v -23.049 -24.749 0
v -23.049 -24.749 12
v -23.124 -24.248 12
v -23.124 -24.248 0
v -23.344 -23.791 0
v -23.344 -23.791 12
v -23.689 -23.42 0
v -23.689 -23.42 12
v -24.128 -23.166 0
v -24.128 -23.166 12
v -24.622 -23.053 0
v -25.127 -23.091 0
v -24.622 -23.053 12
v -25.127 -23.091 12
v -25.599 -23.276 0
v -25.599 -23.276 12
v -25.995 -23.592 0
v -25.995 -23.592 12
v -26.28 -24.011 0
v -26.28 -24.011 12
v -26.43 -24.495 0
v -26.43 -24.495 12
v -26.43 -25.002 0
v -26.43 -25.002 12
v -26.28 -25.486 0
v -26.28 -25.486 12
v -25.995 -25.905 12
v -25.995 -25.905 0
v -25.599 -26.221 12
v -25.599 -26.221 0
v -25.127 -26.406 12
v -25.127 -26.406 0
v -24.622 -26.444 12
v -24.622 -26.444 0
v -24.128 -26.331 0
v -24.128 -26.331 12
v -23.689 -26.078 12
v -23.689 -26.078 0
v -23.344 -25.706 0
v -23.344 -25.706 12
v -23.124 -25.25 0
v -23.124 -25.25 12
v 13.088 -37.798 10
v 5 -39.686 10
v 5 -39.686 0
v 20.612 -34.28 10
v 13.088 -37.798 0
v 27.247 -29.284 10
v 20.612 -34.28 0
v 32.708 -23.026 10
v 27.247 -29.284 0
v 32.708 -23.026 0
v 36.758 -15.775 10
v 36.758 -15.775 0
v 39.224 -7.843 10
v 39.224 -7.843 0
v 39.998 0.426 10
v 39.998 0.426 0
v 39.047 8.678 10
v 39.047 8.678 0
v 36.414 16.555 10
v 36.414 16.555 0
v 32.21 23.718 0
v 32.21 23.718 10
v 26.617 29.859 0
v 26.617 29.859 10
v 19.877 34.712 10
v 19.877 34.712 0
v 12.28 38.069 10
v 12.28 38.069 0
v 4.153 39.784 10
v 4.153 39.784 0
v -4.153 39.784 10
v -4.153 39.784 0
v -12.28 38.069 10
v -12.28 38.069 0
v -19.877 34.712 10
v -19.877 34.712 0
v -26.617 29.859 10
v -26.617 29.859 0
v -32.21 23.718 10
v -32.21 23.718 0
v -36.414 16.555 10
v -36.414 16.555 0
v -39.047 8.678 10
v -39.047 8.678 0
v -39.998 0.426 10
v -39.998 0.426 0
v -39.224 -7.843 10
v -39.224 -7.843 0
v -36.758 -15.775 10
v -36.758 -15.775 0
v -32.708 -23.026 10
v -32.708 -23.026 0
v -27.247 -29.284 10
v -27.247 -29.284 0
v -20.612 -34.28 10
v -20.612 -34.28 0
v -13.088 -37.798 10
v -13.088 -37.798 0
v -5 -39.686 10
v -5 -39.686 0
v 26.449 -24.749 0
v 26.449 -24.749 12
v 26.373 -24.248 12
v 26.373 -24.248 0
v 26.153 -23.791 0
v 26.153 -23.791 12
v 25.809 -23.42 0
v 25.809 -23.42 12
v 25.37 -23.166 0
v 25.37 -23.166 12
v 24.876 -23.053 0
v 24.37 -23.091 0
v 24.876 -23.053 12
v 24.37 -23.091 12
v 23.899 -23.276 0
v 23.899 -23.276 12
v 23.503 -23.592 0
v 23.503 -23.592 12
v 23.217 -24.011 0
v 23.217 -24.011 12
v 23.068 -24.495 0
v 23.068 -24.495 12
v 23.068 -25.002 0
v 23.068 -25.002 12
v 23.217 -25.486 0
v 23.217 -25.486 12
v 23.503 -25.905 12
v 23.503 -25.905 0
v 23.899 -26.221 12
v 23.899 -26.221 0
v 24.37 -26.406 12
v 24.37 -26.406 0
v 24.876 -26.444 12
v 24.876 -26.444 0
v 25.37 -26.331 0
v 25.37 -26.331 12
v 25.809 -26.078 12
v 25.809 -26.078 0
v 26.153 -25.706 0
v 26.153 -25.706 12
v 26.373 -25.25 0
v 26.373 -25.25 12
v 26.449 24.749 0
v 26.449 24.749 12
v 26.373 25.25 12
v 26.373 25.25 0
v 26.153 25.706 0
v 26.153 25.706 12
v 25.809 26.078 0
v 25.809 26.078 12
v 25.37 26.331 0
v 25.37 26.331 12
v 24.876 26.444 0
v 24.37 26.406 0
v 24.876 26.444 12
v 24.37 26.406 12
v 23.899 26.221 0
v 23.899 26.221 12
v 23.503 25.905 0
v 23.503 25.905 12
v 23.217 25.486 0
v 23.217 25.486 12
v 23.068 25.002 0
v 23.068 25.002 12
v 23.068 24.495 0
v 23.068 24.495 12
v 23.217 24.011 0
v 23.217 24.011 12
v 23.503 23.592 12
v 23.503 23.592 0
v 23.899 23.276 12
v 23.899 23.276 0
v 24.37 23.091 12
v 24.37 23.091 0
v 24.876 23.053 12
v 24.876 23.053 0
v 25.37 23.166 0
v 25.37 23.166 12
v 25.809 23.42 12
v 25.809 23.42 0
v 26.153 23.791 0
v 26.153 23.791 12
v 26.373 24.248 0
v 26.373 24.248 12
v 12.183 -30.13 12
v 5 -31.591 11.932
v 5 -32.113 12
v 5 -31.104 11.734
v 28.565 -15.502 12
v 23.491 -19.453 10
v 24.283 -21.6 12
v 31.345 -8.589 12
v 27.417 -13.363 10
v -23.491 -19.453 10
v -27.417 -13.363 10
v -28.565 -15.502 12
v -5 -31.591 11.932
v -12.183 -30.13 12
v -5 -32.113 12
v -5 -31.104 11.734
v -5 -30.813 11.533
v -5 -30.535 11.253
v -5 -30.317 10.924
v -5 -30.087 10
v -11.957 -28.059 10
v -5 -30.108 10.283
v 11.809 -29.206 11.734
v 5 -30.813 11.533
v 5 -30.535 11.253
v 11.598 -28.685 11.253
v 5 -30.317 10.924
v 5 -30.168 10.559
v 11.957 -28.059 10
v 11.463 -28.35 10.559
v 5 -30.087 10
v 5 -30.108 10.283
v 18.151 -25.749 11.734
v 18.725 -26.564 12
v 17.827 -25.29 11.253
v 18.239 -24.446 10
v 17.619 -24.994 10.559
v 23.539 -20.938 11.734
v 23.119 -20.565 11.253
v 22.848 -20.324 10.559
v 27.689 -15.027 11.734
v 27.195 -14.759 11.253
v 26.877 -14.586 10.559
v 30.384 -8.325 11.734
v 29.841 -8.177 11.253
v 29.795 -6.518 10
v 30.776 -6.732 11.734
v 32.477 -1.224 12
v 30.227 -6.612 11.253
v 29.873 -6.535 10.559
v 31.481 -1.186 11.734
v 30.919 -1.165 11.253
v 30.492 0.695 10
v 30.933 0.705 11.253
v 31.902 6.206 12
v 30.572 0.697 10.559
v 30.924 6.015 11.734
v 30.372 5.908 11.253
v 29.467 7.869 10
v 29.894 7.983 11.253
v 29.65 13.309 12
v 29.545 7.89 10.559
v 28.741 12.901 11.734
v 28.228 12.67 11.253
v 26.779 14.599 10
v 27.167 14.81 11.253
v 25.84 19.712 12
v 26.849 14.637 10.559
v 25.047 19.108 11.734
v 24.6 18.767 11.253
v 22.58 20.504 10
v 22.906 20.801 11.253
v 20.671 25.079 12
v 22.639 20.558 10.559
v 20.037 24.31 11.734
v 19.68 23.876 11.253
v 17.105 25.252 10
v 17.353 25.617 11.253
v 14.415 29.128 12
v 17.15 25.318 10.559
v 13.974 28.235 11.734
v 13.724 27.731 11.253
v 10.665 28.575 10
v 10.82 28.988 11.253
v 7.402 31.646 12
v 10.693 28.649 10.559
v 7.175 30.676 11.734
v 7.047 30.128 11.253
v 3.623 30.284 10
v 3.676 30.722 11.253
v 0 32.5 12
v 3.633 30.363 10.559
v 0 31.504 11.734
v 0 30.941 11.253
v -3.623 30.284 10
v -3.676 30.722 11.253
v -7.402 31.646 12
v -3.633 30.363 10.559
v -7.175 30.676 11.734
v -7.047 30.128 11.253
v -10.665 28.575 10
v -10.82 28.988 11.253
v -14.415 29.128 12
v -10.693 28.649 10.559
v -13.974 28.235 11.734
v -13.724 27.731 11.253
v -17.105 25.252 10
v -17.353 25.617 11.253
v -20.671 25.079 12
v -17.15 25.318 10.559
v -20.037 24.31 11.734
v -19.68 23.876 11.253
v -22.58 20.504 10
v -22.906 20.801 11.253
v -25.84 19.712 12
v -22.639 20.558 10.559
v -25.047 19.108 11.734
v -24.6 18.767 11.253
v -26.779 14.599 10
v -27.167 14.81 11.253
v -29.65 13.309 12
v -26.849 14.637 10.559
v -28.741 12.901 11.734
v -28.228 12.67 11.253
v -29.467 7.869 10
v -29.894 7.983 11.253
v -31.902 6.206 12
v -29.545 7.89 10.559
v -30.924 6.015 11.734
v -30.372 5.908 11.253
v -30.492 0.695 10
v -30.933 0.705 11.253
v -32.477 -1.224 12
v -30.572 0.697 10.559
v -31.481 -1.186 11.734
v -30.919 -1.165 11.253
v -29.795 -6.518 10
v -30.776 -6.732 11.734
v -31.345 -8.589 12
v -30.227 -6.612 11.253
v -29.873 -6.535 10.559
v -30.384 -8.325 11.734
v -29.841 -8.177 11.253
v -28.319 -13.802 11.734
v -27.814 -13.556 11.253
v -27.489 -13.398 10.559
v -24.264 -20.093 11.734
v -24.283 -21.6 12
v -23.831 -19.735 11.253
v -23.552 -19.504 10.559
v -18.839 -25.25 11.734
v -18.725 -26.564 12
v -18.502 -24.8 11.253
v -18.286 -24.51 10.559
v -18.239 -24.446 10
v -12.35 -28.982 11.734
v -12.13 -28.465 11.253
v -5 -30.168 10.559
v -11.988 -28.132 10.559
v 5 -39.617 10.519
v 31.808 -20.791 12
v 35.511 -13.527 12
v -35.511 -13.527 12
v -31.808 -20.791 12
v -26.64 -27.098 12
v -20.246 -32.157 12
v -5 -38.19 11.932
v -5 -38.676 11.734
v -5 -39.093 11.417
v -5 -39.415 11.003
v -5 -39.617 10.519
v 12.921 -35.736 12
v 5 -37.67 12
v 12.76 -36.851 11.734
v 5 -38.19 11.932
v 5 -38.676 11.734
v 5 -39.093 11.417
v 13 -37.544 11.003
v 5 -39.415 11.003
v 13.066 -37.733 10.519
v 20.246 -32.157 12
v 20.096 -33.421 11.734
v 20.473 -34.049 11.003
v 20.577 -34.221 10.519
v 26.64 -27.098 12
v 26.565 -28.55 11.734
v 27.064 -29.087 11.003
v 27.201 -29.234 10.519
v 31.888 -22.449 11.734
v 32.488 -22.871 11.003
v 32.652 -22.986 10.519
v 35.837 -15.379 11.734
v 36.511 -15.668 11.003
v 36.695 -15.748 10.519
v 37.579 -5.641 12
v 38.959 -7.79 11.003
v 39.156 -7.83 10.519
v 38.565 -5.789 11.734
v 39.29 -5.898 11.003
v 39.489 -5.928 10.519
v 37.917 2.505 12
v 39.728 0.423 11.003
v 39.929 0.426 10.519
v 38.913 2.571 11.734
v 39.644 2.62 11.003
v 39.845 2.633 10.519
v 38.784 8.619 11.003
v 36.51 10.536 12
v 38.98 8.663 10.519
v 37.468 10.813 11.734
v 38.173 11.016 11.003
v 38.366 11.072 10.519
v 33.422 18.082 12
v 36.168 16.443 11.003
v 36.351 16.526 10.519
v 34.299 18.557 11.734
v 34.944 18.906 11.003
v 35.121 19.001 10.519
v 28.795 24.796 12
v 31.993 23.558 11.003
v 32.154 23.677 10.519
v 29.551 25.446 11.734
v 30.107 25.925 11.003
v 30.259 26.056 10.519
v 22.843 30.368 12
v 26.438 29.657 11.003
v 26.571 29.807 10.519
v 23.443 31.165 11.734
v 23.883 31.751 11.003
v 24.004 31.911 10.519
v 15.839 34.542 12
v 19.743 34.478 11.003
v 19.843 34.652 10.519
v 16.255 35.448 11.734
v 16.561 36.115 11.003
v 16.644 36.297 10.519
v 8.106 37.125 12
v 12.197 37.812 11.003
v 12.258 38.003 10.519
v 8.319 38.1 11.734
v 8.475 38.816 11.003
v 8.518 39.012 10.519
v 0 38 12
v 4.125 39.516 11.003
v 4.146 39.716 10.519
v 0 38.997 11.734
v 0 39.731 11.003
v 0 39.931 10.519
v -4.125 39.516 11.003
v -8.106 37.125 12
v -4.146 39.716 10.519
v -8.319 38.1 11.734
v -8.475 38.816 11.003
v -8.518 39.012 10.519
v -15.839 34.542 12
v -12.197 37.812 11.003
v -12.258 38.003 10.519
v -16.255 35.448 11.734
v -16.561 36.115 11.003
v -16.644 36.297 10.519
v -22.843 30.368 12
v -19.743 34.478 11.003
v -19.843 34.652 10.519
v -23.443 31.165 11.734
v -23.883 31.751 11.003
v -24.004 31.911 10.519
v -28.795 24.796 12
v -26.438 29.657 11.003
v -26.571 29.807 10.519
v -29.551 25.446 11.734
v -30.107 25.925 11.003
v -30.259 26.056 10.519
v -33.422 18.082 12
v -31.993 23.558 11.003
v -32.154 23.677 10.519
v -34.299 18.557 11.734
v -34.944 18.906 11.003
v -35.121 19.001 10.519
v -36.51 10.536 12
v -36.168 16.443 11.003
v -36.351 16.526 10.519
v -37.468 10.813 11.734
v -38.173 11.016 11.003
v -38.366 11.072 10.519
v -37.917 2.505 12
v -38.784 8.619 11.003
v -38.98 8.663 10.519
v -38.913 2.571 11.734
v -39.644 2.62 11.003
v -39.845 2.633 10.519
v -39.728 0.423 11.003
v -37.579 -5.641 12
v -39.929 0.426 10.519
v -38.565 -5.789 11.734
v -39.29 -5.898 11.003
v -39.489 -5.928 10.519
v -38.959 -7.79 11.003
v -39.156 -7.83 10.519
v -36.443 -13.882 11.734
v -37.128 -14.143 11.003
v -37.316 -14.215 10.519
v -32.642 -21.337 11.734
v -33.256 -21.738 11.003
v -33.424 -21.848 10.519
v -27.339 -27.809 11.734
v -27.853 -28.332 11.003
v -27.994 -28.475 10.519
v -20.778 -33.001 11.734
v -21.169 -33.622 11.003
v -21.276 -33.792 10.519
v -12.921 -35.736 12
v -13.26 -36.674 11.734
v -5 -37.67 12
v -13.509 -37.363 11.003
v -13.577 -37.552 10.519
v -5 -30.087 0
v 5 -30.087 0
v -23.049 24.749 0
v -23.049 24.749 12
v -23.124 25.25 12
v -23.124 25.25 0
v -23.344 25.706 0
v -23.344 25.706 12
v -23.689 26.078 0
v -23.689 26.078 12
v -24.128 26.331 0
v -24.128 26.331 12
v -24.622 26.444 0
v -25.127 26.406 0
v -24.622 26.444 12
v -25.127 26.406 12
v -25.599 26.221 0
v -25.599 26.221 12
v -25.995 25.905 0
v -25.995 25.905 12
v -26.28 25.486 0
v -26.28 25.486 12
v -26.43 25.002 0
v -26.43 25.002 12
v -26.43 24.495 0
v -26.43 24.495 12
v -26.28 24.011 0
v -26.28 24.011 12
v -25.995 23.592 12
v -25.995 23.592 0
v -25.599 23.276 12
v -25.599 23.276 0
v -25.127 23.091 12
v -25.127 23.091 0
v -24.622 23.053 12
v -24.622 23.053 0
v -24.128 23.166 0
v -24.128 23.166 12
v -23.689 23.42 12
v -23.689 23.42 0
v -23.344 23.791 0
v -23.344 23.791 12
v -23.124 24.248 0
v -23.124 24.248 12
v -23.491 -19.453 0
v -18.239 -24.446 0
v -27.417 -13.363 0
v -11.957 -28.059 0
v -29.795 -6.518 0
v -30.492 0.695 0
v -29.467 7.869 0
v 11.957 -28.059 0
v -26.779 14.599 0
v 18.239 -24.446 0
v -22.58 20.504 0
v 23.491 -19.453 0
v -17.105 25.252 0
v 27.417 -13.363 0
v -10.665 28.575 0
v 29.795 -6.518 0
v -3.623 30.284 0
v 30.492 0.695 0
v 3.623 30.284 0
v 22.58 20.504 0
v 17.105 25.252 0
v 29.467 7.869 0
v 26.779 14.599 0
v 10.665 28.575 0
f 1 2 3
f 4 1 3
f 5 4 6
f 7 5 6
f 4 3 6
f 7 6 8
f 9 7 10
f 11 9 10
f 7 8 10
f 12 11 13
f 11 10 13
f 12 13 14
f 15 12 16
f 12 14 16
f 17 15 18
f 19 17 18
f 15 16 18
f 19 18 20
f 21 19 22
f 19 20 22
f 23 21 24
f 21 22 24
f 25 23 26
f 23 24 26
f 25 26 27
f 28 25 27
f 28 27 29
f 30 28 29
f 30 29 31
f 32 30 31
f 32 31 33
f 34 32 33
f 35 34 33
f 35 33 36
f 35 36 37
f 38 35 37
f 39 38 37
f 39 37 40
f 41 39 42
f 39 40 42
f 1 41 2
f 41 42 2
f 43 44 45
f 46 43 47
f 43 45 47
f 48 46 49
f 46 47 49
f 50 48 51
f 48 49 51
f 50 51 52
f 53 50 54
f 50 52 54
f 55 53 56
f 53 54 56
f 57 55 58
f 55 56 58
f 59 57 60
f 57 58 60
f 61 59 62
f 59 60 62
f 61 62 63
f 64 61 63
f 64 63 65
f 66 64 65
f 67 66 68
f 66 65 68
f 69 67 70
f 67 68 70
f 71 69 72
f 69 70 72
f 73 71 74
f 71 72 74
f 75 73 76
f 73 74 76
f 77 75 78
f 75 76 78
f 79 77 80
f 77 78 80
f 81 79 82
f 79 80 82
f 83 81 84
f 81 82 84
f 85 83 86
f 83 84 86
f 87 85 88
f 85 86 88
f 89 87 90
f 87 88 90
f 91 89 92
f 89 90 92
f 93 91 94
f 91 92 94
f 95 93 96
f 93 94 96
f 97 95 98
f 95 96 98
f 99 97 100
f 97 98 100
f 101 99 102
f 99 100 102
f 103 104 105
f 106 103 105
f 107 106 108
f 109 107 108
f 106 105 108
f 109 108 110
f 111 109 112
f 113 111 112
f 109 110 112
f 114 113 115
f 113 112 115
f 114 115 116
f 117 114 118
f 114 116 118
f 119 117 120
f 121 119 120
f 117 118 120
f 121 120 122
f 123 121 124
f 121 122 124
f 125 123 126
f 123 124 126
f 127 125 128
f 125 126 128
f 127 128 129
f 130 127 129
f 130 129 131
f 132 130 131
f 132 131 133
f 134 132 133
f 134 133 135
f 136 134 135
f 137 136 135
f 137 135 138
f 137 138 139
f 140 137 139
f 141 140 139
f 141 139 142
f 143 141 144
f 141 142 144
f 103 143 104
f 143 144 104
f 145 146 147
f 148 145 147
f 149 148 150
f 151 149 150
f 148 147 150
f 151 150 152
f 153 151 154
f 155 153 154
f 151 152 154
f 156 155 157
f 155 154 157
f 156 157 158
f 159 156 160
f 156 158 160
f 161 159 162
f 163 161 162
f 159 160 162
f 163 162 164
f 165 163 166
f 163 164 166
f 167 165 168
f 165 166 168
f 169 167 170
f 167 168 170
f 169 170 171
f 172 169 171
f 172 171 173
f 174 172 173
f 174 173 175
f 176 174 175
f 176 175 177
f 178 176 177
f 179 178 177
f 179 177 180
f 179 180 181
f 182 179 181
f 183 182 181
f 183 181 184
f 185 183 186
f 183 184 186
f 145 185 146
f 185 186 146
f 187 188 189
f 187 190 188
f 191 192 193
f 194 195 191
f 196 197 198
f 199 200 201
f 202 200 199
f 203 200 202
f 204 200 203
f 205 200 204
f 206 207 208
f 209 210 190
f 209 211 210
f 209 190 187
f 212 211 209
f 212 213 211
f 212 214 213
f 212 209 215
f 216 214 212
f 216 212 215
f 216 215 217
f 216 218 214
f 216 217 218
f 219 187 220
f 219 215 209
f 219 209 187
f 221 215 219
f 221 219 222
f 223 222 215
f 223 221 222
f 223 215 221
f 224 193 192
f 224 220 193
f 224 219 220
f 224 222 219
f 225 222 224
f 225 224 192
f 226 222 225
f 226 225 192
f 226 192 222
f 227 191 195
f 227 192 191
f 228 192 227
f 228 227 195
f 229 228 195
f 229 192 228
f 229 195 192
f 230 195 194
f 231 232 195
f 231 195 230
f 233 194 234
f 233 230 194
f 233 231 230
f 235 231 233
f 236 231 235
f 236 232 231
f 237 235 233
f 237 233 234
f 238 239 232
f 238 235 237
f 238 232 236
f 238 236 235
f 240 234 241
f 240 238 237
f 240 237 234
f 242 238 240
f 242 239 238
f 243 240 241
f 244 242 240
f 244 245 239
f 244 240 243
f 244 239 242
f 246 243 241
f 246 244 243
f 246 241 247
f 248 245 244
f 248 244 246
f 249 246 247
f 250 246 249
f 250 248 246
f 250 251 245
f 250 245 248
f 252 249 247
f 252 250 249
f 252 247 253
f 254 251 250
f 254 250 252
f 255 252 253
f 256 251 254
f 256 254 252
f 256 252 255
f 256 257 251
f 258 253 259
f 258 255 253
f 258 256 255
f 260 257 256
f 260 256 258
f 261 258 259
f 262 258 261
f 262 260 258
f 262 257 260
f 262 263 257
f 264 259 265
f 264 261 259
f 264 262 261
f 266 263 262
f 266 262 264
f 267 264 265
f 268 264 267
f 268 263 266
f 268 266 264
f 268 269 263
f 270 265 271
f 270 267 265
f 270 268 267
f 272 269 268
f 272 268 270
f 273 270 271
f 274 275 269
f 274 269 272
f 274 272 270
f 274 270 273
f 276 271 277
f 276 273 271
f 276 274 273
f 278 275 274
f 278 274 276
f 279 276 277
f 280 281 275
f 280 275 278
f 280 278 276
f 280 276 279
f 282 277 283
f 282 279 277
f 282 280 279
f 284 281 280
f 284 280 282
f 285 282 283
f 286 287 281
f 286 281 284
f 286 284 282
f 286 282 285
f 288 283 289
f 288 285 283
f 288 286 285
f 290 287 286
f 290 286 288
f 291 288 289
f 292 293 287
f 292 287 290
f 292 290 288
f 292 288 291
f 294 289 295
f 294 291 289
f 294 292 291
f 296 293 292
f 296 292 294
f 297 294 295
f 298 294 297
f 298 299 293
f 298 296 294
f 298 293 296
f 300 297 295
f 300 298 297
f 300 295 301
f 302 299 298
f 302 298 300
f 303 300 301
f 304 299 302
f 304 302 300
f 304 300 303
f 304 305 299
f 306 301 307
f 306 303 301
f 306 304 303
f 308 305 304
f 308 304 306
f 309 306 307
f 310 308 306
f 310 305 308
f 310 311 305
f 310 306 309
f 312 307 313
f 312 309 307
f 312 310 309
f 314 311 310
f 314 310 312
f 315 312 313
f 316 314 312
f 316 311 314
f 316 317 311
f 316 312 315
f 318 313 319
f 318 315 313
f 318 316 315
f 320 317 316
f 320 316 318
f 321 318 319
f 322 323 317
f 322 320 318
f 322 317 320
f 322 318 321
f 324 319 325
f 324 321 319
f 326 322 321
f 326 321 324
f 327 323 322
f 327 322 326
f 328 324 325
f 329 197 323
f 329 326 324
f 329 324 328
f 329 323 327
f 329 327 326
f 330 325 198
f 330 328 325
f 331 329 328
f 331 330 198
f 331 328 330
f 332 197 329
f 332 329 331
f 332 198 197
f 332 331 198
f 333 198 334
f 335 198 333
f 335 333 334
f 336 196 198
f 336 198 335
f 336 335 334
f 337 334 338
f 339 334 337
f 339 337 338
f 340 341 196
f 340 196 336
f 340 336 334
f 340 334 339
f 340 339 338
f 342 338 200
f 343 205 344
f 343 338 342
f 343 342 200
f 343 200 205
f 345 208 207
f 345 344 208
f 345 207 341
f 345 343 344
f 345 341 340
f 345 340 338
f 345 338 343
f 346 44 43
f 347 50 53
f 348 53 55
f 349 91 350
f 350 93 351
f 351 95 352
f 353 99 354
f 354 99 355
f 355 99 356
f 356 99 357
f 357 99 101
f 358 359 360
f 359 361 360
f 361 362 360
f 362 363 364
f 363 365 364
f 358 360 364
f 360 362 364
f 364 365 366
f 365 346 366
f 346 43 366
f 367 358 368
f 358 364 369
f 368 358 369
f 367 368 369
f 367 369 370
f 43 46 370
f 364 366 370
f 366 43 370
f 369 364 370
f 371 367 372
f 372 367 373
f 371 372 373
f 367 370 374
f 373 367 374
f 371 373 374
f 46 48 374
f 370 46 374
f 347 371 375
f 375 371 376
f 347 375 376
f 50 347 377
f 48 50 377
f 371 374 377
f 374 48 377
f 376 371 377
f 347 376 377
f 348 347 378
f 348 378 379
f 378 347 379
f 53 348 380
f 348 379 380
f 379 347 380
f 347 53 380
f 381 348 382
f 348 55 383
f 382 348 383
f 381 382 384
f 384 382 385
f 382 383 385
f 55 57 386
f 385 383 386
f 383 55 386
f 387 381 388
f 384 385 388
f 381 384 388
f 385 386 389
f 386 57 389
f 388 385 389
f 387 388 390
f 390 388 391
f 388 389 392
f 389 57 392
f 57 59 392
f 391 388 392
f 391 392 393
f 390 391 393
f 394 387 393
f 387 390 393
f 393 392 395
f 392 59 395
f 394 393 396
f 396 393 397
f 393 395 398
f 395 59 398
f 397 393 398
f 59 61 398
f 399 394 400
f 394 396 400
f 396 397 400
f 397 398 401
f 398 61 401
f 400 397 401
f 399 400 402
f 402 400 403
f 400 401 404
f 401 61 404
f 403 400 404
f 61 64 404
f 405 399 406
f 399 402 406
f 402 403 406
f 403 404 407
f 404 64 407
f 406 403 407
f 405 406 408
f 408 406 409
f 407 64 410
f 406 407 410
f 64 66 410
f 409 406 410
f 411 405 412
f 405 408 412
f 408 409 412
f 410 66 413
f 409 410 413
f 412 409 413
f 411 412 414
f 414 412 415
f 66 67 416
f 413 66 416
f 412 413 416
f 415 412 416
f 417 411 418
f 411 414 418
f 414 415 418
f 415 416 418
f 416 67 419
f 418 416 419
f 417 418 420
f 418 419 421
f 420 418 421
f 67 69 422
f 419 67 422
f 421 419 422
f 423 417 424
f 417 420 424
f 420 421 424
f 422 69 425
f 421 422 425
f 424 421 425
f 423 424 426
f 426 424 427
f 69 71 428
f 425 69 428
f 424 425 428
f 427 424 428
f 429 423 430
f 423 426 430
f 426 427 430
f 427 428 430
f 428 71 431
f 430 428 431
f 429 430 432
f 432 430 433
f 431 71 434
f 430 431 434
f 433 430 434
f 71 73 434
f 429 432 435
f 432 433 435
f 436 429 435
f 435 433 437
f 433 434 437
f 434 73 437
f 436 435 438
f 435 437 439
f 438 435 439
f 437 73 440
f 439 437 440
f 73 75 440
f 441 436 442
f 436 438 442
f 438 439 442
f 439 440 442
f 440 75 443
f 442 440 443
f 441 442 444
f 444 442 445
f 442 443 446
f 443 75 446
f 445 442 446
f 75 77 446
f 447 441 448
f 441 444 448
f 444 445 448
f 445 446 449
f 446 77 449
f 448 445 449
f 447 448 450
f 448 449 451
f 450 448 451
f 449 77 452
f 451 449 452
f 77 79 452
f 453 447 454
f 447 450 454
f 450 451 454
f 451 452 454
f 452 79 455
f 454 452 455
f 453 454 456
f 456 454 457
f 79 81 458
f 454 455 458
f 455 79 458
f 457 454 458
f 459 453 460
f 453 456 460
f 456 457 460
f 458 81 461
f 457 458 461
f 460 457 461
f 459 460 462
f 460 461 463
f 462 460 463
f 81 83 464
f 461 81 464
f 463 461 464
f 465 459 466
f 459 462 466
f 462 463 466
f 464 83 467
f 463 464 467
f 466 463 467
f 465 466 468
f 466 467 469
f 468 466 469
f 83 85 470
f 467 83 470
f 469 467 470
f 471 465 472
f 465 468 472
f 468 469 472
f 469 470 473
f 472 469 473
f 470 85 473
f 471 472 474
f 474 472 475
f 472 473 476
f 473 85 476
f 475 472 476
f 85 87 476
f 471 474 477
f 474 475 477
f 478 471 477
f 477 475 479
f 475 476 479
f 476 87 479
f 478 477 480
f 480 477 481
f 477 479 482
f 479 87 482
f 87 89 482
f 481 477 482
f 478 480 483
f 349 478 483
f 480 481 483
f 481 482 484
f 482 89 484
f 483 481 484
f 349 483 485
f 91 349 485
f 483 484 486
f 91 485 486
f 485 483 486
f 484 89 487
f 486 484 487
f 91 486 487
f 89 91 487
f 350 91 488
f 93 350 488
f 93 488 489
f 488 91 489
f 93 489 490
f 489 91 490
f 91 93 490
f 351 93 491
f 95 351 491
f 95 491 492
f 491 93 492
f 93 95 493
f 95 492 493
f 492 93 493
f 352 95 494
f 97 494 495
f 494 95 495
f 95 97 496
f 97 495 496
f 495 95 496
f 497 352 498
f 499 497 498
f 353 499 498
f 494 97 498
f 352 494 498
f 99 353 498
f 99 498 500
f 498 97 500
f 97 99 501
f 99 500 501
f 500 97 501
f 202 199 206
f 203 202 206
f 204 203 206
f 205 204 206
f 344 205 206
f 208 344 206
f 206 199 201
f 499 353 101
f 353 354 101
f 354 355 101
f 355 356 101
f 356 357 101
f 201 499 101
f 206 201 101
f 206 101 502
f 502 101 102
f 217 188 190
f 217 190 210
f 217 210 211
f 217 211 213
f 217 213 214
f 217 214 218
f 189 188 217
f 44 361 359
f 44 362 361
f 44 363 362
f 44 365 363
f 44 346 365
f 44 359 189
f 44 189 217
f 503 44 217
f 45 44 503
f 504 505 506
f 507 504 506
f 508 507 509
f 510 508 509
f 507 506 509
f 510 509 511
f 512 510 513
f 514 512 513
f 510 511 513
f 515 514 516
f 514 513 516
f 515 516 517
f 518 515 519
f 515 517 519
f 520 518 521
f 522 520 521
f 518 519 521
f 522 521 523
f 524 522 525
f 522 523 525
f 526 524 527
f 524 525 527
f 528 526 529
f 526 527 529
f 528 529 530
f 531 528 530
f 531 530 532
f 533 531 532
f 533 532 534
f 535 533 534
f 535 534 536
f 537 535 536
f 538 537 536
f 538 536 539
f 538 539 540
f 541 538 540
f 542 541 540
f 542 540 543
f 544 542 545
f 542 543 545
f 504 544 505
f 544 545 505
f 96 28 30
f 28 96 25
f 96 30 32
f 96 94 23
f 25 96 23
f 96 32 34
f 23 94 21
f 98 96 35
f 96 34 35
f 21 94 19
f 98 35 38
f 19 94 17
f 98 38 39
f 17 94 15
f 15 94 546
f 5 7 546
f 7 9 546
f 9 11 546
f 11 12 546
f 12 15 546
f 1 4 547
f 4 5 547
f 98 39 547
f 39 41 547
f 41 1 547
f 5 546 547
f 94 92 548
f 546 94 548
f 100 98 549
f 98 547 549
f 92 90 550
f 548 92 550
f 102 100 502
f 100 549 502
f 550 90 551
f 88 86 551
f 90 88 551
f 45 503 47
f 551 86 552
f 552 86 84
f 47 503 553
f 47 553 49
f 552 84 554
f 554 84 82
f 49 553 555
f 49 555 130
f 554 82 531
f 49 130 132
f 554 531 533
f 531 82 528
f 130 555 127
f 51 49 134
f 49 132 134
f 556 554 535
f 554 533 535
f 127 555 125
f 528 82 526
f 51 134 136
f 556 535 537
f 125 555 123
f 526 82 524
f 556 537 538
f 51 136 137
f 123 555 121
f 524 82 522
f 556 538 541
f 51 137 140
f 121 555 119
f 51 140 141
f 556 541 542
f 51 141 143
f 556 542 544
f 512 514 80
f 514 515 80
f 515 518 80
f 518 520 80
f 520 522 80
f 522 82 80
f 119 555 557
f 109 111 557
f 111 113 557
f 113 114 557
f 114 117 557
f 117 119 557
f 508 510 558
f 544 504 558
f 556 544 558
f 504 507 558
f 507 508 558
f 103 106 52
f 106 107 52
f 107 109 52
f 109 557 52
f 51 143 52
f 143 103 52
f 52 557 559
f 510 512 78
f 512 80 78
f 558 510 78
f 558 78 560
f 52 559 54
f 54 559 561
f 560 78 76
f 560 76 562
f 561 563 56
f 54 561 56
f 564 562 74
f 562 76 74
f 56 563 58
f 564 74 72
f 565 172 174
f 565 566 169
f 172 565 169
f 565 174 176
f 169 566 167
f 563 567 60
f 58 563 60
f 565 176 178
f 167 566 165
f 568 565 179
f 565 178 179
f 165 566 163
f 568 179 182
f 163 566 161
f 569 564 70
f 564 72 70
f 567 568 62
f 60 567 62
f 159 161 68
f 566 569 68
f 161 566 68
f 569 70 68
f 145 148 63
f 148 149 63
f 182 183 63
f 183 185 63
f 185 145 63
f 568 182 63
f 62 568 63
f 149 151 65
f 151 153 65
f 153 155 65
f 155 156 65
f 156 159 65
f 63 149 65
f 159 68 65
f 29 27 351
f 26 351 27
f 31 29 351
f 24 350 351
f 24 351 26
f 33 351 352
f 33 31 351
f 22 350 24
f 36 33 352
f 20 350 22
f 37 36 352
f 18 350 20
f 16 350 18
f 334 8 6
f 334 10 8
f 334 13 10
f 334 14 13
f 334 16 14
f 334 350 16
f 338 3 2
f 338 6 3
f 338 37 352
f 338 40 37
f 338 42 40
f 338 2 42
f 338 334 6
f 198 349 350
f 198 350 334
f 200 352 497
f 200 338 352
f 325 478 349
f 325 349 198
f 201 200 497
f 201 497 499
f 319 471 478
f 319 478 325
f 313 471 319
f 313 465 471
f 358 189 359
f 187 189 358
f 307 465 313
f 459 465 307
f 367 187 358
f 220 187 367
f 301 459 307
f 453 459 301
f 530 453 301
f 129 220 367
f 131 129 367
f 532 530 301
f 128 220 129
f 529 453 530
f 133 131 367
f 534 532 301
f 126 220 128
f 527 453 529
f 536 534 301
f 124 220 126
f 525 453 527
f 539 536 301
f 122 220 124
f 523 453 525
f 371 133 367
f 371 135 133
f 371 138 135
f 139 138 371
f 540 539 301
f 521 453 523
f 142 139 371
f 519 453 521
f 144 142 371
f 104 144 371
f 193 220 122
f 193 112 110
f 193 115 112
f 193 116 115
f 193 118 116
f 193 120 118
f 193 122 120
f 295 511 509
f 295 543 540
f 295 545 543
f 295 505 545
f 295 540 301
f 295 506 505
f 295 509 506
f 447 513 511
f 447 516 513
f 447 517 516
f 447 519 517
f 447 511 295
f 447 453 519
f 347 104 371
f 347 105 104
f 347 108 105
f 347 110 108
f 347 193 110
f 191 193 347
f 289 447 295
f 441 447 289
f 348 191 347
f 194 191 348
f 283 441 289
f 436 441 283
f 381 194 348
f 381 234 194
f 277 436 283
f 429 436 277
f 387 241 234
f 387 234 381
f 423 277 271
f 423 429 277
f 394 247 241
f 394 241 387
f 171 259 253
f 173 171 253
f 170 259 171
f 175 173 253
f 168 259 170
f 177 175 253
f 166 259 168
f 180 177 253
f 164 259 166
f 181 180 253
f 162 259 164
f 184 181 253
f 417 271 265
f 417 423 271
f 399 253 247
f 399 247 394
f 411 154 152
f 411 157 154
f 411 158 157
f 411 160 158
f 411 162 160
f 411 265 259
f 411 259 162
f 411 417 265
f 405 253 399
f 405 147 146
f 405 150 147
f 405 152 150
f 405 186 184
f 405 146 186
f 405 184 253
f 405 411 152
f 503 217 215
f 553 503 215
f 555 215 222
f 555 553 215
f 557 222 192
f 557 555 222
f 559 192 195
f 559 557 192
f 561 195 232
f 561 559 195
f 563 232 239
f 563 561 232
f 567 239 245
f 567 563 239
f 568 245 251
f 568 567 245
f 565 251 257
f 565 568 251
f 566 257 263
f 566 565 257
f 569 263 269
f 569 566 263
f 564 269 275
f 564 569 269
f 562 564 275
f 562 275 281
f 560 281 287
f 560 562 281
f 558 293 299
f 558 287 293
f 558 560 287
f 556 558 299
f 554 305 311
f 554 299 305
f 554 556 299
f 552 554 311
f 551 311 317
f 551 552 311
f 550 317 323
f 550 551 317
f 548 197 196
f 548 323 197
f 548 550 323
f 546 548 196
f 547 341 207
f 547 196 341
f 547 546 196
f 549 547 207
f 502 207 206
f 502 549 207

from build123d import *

# Parameters (mm, degrees)
SKETCH_1_R               = 40
SKETCH_1_R_2             = 30.5
EXTRUDE_1_DEPTH          = 12
SKETCH_2_R               = 1.7
CUT_EXTRUDE_1_DEPTH      = 12
FILLET_1_R               = 2
FILLET_2_R               = 2
CUT_EXTRUDE_2_DEPTH      = 10
CUT_EXTRUDE_2_DEPTH_BACK = 58.827329248
SKETCH_3_W               = 10
SKETCH_3_H               = 17.135936663


with BuildPart() as part:
    # 草图1 → 凸台-拉伸1 (new body)
    with BuildSketch(Plane.XY):
        Circle(SKETCH_1_R)
        Circle(SKETCH_1_R_2, mode=Mode.SUBTRACT)
    extrude(amount=EXTRUDE_1_DEPTH)

    # 草图2 → 切除-拉伸1 (cut)
    with BuildSketch(Plane.XY.offset(12)):
        with Locations((24.748737342, 24.748737342)):
            Circle(SKETCH_2_R)
        with Locations((24.748737342, -24.748737342)):
            Circle(SKETCH_2_R)
        with Locations((-24.748737342, -24.748737342)):
            Circle(SKETCH_2_R)
        with Locations((-24.748737342, 24.748737342)):
            Circle(SKETCH_2_R)
    extrude(amount=-CUT_EXTRUDE_1_DEPTH, mode=Mode.SUBTRACT)

    # 圆角1
    fillet_1_edges = [part.edges().sort_by_distance(p)[0] for p in [
        (-30.5, 0, 12),
    ]]
    fillet(fillet_1_edges, radius=FILLET_1_R)

    # 圆角2
    fillet_2_edges = [part.edges().sort_by_distance(p)[0] for p in [
        (-40, 0, 12),
    ]]
    fillet(fillet_2_edges, radius=FILLET_2_R)

    # 草图3 → 切除-拉伸2 (cut, two sides: drawn at the far end of the back side and taken through both)
    with BuildSketch(Plane(origin=(0, 0, 0), x_dir=(1, 0, 0), z_dir=(0, 1, 0)).offset(-CUT_EXTRUDE_2_DEPTH_BACK)):
        with Locations((0, -8.567968332)):
            Rectangle(SKETCH_3_W, SKETCH_3_H)
    extrude(amount=CUT_EXTRUDE_2_DEPTH + CUT_EXTRUDE_2_DEPTH_BACK, mode=Mode.SUBTRACT)


solid = part.part
